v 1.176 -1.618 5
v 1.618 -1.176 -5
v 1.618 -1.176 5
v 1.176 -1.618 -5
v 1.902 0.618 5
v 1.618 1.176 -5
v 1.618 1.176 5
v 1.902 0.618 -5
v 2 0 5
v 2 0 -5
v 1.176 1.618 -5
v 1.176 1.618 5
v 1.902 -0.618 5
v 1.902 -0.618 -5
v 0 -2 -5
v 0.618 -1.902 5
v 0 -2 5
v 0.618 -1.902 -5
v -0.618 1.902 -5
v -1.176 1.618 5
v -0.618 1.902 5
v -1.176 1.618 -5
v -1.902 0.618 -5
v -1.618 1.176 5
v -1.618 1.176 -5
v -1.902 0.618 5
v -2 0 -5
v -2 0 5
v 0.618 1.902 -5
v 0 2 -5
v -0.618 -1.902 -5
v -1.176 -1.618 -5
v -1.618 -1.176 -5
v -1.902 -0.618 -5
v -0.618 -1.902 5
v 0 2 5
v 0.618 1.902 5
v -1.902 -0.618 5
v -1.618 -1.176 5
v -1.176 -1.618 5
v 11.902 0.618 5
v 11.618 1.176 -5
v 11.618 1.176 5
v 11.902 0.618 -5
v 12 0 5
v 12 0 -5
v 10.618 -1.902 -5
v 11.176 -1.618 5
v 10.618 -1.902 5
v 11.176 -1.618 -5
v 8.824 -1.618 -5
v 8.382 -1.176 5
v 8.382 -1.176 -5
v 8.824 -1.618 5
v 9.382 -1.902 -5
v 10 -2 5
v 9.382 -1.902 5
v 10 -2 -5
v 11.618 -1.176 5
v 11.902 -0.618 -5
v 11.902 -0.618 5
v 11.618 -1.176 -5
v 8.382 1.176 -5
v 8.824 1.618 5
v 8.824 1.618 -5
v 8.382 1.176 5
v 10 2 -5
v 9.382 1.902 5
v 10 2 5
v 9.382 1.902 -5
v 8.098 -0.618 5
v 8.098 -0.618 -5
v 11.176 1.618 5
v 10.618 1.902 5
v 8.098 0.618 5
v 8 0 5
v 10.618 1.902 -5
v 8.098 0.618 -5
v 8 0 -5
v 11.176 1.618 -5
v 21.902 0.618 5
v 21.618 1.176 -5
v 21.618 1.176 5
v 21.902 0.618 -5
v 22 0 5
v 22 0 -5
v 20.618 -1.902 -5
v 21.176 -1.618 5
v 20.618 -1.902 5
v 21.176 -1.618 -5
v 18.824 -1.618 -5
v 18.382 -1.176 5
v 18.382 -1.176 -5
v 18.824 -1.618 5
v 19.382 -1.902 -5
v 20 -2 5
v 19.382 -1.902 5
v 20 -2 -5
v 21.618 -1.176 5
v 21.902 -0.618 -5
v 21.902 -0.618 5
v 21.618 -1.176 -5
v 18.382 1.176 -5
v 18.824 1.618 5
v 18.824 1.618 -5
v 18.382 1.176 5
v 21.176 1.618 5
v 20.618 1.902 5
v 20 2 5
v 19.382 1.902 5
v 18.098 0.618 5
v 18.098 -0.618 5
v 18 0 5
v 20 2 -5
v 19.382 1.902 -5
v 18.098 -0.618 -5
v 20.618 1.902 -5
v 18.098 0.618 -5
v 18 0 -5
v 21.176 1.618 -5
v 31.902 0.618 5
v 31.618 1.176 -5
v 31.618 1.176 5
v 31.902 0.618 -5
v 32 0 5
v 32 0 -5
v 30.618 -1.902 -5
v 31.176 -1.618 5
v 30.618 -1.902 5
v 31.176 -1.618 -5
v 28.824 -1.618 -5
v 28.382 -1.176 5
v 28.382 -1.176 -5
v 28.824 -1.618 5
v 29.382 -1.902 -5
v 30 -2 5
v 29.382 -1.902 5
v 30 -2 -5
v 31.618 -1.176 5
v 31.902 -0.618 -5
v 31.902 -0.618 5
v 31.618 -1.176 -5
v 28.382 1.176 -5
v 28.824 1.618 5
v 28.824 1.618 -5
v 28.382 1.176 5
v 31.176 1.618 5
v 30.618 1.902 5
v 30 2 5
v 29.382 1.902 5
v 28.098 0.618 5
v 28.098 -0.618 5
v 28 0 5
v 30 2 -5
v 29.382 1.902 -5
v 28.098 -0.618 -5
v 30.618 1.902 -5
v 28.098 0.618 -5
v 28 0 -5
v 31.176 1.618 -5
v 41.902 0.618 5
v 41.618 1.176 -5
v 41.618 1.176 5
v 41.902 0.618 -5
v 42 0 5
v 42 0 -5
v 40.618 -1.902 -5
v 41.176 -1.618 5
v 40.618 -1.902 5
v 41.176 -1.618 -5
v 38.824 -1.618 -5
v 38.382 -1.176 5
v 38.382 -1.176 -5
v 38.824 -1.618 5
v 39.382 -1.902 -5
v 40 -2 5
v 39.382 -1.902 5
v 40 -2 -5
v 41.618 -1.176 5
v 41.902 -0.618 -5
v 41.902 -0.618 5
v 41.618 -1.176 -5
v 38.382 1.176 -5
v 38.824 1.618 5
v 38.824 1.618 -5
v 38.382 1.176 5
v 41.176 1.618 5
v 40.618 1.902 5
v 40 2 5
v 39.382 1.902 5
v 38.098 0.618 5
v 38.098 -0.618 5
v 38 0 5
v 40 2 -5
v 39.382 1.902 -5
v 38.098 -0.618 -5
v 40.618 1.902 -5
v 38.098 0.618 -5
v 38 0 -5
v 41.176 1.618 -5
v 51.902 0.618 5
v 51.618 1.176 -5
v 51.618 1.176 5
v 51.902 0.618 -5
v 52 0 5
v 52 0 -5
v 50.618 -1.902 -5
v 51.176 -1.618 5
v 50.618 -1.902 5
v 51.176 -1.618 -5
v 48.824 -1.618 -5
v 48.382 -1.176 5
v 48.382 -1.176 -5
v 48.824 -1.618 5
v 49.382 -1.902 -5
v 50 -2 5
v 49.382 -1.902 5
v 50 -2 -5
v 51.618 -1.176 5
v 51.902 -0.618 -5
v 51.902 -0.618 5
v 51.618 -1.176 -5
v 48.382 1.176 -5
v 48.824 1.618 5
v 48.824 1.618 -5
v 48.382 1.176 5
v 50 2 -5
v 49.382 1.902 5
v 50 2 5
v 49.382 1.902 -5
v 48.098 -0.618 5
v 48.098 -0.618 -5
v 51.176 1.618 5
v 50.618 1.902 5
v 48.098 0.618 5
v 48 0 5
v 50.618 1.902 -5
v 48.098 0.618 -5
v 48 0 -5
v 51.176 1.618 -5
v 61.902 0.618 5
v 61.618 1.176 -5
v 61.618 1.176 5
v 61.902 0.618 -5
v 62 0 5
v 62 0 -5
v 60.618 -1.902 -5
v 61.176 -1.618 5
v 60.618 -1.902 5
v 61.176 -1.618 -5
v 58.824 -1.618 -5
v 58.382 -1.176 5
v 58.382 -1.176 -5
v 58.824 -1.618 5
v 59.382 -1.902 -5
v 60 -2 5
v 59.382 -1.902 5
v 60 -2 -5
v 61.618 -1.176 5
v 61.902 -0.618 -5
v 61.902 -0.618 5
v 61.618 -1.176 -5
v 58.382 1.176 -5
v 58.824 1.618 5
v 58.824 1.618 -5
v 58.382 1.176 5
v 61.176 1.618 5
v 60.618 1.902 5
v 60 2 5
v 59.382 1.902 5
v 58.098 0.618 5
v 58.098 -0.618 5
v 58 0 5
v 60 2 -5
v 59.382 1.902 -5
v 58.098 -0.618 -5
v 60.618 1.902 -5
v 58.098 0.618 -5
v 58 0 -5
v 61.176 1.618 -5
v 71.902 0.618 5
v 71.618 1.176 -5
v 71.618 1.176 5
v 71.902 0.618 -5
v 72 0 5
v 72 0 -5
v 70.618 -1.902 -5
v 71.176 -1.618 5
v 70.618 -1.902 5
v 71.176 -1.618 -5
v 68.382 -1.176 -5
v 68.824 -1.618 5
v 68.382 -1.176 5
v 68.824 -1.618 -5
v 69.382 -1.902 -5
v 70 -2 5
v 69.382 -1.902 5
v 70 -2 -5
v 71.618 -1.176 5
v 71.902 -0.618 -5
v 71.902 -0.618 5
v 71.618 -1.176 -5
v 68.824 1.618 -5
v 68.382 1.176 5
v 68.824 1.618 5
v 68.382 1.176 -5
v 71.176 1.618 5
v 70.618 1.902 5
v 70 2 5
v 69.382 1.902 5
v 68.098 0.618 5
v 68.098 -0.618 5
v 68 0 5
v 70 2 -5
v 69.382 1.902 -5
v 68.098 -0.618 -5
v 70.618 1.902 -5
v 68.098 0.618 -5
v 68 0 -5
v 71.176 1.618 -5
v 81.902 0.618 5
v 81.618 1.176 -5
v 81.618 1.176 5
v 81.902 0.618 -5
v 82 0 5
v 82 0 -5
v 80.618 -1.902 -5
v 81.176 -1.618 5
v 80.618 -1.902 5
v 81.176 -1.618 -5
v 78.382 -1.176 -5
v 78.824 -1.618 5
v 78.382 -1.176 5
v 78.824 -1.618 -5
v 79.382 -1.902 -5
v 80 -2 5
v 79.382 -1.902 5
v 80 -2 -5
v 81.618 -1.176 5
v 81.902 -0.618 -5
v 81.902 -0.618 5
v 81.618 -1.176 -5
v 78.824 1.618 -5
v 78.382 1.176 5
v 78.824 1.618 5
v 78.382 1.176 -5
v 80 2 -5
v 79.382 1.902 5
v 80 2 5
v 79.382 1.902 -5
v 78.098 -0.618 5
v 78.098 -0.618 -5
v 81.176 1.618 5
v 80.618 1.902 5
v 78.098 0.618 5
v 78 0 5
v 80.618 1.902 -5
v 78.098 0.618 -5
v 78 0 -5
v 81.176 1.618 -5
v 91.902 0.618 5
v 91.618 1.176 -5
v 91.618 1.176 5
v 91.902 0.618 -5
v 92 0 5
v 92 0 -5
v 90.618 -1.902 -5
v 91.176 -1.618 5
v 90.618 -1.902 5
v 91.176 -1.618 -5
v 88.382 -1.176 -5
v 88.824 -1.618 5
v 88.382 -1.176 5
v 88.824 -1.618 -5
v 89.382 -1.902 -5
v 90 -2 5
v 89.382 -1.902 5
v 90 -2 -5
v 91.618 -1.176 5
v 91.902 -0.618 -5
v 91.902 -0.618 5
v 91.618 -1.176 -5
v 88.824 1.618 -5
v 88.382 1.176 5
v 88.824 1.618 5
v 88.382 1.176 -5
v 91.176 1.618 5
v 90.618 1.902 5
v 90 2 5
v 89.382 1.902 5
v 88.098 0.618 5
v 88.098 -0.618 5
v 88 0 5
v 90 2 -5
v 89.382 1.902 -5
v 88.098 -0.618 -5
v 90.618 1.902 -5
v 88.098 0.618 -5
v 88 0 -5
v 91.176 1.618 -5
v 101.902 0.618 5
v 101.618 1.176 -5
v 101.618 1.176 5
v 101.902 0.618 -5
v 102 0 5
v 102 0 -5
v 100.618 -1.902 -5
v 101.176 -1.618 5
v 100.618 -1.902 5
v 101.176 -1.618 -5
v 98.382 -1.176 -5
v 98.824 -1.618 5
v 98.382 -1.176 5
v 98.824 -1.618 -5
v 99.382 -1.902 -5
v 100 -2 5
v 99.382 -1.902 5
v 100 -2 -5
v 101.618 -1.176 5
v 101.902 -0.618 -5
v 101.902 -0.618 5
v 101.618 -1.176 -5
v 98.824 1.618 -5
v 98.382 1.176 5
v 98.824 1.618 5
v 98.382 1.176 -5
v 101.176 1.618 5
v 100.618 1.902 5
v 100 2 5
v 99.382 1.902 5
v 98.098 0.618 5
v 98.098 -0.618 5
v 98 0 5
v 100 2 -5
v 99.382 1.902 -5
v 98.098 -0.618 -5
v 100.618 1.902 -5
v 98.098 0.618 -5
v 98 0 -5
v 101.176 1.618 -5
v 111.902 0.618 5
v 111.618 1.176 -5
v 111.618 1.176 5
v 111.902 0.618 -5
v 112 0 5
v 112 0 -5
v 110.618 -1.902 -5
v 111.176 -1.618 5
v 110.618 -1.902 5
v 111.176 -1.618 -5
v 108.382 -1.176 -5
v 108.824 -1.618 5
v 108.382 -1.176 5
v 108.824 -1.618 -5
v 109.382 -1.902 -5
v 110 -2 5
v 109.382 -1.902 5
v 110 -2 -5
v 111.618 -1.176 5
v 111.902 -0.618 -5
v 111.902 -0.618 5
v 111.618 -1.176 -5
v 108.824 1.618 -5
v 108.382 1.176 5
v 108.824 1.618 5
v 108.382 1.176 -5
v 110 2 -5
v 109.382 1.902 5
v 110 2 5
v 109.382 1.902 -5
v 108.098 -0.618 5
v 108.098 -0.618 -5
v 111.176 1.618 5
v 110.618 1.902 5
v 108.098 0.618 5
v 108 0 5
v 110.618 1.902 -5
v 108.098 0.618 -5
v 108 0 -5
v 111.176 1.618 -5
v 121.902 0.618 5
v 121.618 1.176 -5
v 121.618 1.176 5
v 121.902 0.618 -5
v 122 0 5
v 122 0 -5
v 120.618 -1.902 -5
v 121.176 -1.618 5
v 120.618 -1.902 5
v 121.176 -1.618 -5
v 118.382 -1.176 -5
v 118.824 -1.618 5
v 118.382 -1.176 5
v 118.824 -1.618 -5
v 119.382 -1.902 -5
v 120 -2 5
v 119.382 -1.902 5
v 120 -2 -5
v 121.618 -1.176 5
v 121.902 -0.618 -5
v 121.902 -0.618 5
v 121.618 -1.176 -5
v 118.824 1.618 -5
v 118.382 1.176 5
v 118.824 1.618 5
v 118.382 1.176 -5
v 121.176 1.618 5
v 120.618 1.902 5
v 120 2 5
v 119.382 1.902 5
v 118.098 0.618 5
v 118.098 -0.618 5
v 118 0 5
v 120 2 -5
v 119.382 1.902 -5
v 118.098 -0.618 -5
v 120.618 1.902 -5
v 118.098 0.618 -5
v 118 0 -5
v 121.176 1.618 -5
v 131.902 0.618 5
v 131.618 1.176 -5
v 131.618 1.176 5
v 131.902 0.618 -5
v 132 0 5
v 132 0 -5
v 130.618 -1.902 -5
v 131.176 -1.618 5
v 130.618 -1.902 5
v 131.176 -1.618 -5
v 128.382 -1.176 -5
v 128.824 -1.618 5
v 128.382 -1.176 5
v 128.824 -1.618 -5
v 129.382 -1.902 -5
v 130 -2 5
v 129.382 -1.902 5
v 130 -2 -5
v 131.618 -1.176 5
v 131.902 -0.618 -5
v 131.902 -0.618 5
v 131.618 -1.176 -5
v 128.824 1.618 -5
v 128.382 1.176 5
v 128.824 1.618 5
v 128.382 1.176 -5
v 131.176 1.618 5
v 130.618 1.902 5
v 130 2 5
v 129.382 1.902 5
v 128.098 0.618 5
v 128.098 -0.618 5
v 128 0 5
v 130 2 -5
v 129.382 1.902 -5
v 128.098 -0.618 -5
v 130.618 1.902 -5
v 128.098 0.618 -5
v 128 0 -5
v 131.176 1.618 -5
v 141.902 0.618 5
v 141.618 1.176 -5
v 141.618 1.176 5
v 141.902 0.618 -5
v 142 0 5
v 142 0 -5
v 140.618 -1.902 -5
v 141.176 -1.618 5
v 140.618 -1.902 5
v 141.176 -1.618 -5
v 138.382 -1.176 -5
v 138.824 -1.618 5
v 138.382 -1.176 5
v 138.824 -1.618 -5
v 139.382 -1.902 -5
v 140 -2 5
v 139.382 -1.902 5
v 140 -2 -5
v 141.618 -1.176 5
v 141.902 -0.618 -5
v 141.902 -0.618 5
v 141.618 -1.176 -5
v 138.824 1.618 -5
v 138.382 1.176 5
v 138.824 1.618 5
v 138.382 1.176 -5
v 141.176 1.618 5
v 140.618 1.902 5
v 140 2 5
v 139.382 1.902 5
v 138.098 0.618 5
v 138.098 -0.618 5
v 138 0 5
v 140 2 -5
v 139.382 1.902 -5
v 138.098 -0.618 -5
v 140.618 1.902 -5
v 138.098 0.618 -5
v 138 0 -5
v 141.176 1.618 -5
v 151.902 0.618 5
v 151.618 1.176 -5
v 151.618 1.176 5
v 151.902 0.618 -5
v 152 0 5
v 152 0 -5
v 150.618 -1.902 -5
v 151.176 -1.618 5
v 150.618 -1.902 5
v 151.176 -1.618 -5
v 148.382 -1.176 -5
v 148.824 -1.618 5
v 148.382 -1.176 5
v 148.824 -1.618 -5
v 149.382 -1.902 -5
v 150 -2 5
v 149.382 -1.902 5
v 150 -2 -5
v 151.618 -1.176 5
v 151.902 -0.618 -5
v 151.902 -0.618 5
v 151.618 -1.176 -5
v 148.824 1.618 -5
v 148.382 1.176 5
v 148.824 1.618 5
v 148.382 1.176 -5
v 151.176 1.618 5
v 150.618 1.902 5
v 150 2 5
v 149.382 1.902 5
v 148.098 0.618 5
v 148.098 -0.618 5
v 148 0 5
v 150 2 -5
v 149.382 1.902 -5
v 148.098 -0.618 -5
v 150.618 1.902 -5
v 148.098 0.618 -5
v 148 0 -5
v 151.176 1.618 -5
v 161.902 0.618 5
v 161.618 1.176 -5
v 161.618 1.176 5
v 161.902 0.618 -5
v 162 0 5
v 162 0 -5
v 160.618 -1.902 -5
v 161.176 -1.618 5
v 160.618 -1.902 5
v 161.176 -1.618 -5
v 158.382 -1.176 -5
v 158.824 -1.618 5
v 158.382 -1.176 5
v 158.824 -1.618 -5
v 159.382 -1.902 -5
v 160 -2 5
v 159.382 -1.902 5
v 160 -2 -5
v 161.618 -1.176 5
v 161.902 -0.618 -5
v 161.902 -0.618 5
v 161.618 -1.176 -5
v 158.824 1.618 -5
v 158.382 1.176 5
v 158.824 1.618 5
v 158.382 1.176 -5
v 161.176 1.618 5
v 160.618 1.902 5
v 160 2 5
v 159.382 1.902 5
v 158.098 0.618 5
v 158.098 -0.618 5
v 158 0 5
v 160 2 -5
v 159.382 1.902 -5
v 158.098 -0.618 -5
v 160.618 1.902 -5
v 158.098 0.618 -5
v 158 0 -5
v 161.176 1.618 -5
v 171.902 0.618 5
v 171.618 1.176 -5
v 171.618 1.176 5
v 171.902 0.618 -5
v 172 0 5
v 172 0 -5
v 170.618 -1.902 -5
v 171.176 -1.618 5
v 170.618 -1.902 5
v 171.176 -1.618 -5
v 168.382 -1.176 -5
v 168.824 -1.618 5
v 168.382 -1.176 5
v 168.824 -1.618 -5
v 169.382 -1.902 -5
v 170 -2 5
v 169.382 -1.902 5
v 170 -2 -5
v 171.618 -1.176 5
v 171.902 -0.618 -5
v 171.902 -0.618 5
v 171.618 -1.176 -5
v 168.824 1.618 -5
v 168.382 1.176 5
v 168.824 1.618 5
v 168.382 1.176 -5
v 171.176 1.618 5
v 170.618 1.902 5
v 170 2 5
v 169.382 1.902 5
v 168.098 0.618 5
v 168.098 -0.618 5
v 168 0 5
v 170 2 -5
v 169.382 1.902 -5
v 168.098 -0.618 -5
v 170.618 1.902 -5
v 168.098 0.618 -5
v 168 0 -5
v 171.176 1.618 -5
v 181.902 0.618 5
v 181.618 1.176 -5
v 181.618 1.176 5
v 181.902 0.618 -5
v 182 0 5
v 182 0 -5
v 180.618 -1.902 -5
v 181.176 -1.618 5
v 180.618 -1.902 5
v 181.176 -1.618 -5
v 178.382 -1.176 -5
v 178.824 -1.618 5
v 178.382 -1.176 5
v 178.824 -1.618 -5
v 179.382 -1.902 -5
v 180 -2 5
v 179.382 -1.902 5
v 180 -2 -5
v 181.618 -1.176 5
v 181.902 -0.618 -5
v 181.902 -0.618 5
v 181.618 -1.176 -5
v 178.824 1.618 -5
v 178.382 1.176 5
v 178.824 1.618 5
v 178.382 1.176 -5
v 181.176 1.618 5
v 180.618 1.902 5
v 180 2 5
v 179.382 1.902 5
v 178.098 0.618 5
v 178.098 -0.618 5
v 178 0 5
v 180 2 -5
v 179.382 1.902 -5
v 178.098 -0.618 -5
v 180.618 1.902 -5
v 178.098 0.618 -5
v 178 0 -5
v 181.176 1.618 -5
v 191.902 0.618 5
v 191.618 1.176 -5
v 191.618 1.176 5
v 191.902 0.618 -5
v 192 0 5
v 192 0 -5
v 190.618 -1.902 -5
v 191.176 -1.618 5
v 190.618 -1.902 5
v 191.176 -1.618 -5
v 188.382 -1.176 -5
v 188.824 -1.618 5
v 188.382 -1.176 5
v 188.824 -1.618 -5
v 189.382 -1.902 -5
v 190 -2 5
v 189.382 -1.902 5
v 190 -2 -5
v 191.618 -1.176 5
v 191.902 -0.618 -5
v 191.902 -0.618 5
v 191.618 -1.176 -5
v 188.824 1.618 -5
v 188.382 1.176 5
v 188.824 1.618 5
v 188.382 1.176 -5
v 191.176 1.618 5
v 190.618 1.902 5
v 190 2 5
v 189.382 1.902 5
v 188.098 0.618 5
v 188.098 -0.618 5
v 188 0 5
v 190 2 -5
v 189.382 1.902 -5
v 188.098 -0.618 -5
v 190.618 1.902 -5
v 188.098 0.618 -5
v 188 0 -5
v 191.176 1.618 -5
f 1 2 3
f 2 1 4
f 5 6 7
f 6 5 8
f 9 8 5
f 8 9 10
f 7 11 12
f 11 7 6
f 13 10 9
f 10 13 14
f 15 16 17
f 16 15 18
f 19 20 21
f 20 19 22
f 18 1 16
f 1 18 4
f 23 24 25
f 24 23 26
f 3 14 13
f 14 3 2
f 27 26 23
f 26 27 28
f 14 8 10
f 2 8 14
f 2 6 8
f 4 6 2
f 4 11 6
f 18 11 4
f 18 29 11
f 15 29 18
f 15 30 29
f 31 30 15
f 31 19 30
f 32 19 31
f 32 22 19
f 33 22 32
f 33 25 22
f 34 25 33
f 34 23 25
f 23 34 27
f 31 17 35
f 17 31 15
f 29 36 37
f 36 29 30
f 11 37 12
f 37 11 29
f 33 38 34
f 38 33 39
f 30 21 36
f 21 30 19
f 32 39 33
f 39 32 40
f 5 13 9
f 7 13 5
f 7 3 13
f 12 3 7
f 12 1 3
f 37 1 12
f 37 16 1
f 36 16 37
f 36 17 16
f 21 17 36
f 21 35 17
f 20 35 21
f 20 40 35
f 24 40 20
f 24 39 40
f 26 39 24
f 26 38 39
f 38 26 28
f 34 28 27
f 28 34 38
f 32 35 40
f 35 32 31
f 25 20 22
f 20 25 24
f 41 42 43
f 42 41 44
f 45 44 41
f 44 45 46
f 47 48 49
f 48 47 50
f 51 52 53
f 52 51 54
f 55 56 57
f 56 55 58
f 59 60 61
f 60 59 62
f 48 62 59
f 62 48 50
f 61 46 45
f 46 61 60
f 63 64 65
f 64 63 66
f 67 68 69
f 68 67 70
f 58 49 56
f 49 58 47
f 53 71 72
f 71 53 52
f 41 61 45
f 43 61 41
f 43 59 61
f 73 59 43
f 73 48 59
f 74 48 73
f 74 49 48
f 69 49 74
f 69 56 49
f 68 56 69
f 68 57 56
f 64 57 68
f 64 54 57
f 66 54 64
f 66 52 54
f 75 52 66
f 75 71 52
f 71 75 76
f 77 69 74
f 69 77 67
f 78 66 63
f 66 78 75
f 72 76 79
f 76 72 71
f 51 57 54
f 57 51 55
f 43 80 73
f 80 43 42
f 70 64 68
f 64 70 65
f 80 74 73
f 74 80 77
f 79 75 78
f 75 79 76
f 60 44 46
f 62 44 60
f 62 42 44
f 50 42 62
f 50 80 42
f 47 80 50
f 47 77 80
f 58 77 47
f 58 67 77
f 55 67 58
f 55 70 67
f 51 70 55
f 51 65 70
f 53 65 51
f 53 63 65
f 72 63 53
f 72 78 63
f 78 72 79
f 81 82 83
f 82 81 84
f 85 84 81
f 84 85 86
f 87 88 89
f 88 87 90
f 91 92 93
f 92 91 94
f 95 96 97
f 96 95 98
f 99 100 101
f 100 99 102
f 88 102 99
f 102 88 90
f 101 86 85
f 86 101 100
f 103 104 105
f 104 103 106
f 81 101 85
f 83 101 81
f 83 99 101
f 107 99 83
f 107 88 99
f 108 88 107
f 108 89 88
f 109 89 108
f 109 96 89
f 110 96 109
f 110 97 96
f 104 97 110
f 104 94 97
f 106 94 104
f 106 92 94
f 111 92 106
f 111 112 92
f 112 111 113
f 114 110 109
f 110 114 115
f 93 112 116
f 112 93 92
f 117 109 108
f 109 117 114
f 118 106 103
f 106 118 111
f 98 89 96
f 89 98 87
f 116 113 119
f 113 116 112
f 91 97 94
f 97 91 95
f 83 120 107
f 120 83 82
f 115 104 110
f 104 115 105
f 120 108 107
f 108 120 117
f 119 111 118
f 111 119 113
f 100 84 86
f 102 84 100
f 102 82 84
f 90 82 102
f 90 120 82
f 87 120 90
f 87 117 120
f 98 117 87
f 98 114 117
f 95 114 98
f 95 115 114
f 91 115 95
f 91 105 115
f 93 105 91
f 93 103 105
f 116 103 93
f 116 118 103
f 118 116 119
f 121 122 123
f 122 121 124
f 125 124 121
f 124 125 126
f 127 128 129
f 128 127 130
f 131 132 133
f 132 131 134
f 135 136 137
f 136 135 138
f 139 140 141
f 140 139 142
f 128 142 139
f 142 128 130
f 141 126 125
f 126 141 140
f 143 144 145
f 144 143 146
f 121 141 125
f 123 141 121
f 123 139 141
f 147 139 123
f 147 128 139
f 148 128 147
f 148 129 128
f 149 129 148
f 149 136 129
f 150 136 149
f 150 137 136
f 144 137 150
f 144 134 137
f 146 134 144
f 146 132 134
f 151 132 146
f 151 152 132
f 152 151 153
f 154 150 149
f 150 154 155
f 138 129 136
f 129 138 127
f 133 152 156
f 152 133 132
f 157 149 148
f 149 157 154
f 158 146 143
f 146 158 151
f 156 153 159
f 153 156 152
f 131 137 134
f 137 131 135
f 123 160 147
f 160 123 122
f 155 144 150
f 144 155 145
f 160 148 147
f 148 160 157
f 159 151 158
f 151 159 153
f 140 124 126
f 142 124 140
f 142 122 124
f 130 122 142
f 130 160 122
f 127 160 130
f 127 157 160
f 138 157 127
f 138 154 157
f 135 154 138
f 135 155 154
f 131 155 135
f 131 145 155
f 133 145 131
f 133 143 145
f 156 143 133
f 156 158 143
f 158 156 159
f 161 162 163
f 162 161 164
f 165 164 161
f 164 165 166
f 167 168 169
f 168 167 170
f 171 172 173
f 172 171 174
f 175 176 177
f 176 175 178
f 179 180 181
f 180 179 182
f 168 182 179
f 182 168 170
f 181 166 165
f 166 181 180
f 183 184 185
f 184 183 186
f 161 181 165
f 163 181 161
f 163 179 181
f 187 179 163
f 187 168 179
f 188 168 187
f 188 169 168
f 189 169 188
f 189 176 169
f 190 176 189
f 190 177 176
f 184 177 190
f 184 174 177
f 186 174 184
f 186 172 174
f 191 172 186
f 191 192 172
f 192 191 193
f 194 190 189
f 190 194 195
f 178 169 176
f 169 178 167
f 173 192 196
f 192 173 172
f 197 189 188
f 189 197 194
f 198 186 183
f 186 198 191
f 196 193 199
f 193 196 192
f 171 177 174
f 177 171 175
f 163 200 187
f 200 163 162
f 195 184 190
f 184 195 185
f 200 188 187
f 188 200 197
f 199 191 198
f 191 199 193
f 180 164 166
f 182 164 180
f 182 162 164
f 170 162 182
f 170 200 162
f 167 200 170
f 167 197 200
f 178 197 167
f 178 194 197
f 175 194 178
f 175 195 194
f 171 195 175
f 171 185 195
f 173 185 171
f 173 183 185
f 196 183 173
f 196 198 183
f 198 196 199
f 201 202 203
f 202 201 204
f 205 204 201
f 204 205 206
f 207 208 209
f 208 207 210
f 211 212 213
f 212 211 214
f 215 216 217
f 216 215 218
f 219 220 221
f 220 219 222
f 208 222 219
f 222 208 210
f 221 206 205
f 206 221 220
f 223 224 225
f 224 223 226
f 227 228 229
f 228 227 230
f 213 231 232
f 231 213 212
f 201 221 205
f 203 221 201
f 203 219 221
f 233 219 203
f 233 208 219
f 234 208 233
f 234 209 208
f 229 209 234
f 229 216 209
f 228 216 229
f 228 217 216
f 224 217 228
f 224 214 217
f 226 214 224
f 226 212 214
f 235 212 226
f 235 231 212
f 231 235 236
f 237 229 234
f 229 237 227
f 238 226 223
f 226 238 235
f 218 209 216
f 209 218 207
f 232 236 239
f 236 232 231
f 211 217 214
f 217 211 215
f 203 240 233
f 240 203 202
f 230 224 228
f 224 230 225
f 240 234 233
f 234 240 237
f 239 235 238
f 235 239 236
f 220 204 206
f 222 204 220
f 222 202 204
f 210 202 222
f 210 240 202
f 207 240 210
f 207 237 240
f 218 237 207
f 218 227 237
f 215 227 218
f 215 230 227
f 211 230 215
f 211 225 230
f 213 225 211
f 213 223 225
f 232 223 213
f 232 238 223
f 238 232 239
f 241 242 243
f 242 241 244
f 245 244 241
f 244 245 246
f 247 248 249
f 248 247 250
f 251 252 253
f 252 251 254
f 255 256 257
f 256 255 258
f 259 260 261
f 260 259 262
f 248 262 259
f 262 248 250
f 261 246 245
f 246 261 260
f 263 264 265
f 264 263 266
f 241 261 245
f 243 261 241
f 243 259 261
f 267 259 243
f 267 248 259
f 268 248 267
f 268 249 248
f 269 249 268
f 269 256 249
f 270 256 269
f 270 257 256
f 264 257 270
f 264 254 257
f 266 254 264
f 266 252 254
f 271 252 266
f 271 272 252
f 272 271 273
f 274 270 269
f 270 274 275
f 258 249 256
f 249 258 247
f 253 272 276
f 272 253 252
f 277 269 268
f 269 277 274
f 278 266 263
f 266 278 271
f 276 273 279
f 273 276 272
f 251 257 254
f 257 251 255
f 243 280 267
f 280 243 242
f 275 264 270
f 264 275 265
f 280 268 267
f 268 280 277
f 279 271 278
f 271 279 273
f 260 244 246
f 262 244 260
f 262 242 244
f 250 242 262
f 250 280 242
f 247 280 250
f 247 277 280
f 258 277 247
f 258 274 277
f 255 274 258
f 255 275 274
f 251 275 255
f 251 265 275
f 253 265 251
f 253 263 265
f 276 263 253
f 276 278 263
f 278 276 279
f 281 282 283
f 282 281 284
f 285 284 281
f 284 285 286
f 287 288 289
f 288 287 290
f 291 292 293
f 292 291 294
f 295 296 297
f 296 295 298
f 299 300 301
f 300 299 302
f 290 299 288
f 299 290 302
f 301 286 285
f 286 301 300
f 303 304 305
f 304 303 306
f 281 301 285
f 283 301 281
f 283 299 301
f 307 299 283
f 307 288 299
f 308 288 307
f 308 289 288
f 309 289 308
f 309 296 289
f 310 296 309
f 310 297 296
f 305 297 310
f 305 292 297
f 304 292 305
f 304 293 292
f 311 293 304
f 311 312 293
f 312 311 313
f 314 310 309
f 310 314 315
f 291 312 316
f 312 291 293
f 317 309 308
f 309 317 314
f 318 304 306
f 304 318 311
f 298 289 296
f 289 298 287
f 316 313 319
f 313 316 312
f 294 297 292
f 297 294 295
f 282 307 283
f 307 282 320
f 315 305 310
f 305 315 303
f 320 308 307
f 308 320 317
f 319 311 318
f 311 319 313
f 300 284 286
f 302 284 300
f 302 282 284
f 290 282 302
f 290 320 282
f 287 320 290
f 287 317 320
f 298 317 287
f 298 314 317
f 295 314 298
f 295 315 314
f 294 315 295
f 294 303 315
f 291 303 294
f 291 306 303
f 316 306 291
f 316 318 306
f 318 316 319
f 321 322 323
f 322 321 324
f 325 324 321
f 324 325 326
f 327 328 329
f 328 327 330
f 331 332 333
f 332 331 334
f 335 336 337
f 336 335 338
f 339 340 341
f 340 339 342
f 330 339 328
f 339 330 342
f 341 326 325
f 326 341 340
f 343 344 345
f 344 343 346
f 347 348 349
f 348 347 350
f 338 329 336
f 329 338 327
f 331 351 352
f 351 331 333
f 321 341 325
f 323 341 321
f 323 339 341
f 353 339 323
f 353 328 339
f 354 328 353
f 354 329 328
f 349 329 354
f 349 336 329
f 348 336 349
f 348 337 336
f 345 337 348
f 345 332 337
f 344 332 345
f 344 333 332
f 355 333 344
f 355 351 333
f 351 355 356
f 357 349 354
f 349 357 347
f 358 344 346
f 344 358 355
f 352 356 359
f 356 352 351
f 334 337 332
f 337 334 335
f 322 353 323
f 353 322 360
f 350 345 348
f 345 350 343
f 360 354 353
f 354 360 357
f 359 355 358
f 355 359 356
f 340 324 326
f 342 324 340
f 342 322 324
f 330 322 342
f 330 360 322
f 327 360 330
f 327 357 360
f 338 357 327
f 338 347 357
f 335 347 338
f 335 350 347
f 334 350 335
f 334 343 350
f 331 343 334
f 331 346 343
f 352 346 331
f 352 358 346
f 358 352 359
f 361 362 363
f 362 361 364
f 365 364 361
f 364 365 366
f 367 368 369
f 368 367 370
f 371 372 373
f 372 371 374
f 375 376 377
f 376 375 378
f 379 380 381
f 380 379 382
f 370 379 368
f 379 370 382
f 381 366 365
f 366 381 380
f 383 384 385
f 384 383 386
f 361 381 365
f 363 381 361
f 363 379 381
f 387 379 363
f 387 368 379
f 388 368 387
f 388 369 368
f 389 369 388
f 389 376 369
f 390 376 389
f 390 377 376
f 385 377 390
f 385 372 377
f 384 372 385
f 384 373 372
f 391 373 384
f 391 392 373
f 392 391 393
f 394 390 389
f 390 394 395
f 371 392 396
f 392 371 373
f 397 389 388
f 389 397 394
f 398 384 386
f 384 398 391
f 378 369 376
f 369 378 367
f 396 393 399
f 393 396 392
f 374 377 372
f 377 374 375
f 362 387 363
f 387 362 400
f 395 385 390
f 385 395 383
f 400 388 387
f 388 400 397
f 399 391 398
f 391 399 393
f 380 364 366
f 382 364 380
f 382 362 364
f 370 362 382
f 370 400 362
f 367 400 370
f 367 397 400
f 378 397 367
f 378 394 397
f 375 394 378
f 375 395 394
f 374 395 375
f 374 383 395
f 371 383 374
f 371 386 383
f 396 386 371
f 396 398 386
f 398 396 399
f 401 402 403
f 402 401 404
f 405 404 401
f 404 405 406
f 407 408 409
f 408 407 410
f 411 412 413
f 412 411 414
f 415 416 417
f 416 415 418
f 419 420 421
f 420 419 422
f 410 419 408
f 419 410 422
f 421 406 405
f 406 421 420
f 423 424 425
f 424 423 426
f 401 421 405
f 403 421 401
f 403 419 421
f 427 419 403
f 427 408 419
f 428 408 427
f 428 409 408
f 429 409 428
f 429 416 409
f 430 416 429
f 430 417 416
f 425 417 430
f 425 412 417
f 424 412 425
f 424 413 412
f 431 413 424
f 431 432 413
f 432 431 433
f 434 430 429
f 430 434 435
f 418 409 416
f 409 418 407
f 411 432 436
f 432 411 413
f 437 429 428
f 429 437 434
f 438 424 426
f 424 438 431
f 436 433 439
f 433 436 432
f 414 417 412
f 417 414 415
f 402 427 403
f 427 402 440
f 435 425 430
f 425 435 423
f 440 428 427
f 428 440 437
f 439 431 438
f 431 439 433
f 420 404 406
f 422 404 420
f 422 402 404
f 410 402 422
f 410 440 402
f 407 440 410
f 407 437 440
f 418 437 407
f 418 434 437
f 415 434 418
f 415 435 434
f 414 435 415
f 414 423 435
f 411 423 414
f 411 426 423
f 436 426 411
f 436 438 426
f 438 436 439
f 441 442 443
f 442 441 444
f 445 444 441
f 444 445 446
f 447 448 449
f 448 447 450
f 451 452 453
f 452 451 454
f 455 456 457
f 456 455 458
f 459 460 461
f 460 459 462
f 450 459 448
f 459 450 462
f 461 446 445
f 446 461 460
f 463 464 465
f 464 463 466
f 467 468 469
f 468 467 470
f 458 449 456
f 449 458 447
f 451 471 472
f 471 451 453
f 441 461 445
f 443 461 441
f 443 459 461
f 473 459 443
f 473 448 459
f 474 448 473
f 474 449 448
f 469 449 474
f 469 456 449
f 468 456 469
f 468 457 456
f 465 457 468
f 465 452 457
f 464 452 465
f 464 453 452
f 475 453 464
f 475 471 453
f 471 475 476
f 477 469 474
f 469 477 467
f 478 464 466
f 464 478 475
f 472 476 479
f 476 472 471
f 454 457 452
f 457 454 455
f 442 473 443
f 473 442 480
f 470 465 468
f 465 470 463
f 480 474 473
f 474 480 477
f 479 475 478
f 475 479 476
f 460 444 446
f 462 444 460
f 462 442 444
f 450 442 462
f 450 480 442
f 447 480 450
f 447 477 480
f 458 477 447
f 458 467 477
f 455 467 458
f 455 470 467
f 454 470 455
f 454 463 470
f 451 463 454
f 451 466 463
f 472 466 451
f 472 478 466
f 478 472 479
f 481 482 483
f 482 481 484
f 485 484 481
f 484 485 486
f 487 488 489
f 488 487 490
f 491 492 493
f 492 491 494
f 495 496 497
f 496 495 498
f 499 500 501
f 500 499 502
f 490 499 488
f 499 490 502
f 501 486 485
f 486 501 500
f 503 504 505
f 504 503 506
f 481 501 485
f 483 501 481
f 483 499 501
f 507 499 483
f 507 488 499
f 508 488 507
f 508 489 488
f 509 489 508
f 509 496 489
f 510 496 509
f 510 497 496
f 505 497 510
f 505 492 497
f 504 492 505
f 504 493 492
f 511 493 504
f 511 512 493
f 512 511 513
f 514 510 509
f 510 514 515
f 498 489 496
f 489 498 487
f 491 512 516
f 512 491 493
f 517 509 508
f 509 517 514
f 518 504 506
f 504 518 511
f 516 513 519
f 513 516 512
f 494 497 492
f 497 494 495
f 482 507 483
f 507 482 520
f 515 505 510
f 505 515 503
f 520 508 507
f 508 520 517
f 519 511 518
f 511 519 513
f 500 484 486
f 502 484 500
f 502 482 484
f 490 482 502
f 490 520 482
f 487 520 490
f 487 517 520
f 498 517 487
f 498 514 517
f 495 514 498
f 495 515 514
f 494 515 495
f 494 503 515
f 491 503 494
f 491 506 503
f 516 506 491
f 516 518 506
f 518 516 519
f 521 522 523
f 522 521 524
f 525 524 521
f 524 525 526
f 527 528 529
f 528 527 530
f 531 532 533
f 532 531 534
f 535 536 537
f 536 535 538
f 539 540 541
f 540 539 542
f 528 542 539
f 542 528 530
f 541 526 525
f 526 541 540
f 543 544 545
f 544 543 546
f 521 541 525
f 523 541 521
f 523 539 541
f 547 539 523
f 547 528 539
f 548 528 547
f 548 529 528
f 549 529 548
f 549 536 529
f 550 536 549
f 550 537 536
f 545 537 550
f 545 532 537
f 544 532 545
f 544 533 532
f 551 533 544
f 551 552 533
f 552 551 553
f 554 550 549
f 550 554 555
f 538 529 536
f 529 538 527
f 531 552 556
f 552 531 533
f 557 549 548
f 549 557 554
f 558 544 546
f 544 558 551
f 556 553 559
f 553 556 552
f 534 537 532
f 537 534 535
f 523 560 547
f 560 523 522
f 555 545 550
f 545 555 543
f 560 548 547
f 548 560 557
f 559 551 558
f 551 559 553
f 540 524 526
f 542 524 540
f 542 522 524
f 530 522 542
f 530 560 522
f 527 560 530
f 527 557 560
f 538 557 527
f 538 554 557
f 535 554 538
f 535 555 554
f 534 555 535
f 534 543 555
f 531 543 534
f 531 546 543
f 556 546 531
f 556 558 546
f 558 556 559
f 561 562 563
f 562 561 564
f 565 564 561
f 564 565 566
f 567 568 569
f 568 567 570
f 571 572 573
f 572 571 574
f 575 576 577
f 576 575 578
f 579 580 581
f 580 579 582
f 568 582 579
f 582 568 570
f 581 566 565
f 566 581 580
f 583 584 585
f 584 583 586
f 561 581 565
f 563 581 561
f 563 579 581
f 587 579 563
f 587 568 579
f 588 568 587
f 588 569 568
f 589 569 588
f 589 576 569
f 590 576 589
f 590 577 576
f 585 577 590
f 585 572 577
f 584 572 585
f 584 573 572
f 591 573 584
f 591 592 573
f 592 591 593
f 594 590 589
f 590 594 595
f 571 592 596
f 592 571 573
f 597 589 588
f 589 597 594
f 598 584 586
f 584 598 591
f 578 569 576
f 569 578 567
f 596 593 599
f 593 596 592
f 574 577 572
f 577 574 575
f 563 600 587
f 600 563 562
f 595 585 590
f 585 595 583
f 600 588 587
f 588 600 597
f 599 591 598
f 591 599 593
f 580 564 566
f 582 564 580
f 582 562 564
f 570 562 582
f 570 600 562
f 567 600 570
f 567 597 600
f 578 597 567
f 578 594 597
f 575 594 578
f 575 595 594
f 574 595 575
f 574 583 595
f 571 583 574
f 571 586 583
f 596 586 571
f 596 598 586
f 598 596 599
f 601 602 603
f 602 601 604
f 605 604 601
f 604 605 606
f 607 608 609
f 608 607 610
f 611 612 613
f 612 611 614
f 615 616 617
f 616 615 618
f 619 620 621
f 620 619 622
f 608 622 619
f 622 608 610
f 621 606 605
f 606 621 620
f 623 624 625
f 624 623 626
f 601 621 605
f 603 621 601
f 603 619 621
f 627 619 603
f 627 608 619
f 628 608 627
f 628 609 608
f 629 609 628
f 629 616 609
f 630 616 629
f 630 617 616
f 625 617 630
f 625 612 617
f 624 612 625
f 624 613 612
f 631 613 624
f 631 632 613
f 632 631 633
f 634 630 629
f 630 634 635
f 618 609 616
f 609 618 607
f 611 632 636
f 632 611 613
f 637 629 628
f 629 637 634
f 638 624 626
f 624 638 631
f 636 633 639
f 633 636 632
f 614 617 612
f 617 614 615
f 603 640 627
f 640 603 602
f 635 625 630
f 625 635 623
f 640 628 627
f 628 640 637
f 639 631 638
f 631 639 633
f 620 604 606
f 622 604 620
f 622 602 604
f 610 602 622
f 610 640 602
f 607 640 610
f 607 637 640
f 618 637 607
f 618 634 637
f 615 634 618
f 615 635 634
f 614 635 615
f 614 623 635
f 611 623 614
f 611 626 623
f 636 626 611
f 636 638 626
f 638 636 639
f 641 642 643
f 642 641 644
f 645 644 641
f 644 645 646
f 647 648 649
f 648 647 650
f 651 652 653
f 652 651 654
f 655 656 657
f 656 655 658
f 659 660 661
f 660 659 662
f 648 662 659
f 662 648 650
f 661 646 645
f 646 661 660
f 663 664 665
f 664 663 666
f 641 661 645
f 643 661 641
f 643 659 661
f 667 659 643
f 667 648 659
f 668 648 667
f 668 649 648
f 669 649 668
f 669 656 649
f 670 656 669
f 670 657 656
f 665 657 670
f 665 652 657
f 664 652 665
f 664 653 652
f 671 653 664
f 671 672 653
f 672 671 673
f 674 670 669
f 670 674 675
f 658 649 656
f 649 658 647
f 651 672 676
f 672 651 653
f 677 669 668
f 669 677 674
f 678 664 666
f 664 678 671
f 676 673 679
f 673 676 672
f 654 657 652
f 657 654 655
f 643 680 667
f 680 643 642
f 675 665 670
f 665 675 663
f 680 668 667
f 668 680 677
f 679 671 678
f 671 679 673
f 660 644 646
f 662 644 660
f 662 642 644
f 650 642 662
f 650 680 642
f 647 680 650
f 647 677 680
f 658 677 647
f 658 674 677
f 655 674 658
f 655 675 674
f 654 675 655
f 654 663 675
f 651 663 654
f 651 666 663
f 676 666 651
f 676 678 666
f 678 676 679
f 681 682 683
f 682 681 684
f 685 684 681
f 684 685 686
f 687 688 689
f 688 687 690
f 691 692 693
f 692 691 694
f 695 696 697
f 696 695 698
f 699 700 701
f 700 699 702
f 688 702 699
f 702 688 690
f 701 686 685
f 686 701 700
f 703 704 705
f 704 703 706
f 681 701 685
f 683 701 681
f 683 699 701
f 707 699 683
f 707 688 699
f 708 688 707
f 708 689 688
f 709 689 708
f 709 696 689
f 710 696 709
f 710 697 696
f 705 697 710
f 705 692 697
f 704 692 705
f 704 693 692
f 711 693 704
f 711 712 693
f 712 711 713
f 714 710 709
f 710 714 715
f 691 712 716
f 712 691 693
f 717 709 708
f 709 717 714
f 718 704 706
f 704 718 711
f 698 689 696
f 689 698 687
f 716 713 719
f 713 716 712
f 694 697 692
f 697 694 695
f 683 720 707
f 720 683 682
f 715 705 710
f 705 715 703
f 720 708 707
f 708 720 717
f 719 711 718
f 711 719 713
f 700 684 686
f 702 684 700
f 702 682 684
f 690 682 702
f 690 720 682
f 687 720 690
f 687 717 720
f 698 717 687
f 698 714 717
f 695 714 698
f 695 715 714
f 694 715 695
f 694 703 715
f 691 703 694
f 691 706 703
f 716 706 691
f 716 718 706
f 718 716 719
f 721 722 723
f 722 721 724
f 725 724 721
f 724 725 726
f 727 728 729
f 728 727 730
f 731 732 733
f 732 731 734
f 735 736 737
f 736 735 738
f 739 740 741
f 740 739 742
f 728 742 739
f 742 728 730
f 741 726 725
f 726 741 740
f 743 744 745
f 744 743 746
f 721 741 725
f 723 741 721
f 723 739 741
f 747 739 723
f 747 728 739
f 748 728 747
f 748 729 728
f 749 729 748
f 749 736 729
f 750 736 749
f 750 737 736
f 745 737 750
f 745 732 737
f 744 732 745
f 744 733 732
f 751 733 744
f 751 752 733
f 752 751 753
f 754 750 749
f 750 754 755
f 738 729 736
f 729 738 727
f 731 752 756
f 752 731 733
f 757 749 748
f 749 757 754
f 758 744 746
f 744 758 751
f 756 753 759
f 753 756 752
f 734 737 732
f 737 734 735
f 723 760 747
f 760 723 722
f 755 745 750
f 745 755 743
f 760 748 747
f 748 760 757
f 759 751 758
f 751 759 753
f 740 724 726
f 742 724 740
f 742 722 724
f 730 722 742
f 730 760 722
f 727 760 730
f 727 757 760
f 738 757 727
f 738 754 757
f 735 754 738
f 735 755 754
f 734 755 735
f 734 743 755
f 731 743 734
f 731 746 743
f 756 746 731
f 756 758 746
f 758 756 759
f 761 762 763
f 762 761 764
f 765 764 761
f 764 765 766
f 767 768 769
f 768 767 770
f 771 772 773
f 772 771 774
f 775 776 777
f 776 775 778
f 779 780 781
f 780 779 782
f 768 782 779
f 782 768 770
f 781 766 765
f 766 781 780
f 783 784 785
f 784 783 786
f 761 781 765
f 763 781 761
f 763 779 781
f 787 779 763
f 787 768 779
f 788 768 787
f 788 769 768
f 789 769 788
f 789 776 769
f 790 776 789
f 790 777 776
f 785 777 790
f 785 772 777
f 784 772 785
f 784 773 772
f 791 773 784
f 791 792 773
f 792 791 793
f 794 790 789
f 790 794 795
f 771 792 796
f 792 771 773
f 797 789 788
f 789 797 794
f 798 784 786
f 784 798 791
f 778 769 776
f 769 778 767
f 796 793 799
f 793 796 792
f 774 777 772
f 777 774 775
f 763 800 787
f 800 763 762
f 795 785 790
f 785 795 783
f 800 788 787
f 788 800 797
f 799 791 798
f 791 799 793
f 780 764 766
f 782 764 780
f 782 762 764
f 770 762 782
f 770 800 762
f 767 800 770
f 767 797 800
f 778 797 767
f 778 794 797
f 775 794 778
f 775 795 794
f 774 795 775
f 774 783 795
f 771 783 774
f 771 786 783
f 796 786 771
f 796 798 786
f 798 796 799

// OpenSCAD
// file: utils/build_plate.scad
// Build Plate representation module
// Made by Makerbot (http://curriculum.makerbot.com/daily_lessons/february/openscad_buildplate.html)

//use this to include a build plate visualization in your openSCAD scripts. Very useful for things designed to be edited in Makerbot Customizer

//to use, either include or use <utils/build_plate.scad>

//then just call build_plate(); with the following arguments (also, you have to have a real object in your scene for this to render)

//putting 0 as the first argument will give you a Replicator 2 build plate
//putting 1 as the first argument will give you a Replicator 1 build plate
//putting 2 as the first argument will give you a Thingomatic build plate
//putting 3 as the first argument will give you a manually adjustable build plate (note: if you use this option, you need to specify your build plates X length (in mm) as the second argument and the Y length (in mm) as the third argument. eg. build_plate(3,150,120);)

/*

to give your user control of which build plate they see in Customizer, include the following code:

use <utils/build_plate.scad>

//for display only, doesn't contribute to final object
build_plate_selector = 0; //[0:Replicator 2,1: Replicator,2:Thingomatic,3:Manual]
//when Build Plate Selector is set to "manual" this controls the build plate x dimension
build_plate_manual_x = 100; //[100:400]
//when Build Plate Selector is set to "manual" this controls the build plate y dimension
build_plate_manual_y = 100; //[100:400]

build_plate(build_plate_selector,build_plate_manual_x,build_plate_manual_y);

*/




//to see how this works, uncomment the following code

//build_plate_selector = 0; //[0:Replicator 2,1: Replicator,2:Thingomatic,3:Manual]
//build_plate_manual_x = 100; //[100:400]
//build_plate_manual_y = 100; //[100:400]
//
//build_plate(build_plate_selector,build_plate_manual_x,build_plate_manual_y);
//
//cube(5);


module build_plate(bp,manX,manY){

		translate([0,0,-.52]){
			if(bp == 0){
				%cube([285,153,1],center = true);
			}
			if(bp == 1){
				%cube([225,145,1],center = true);
			}
			if(bp == 2){
				%cube([120,120,1],center = true);
			}
			if(bp == 3){
				%cube([manX,manY,1],center = true);
			}
		
		}
		translate([0,0,-.5]){
			if(bp == 0){
				for(i = [-14:14]){
					translate([i*10,0,0])
					%cube([.5,153,1.01],center = true);
				}
				for(i = [-7:7]){
					translate([0,i*10,0])
					%cube([285,.5,1.01],center = true);
				}	
			}
			if(bp == 1){
				for(i = [-11:11]){
					translate([i*10,0,0])
						%cube([.5,145,1.01],center = true);
				}
				for(i = [-7:7]){
					translate([0,i*10,0])
						%cube([225,.5,1.01],center = true);
				}
			}
			if(bp == 2){
				for(i = [-6:6]){
					translate([i*10,0,0])
						%cube([.5,120,1.01],center = true);
				}
				for(i = [-6:6]){
					translate([0,i*10,0])
						%cube([120,.5,1.01],center = true);
				}
			}
			if(bp == 3){
				for(i = [-(floor(manX/20)):floor(manX/20)]){
					translate([i*10,0,0])
						%cube([.5,manY,1.01],center = true);
				}
				for(i = [-(floor(manY/20)):floor(manY/20)]){
					translate([0,i*10,0])
						%cube([manX,.5,1.01],center = true);
				}
			}
		}
}
// main file
use <./utils/build_plate.scad> // Cuadricula transparente para la base
build_plate(3, 200,100); // No se incluye al renderizar


//----------------------------------------------------------
//-- Tutorial OpenScad
//-- Juan Gonzalez-Gomez (Obijuan) juan@iearobotics.com
//----------------------------------------------------------
//-- (c) Mayo, 2012
//-- Licencia GPL
//----------------------------------------------------------
//-- Ejemplo de repeticion de tareas
//-- Se crea una tira variable de cilindros para hacer taladros
//----------------------------------------------------------

//-- Parametros de los cilindros
drill=4;
h1=10;
d=10;

//-- Numero de cilindros a crear
n = 20;

//-- Bucle: crear n cilindros trasladados a lo largo del eje x
for (i=[0:n-1]) {
  translate([i*d,0,0])
    cylinder(r=drill/2, h=h1, $fn=20,center=true);
}
